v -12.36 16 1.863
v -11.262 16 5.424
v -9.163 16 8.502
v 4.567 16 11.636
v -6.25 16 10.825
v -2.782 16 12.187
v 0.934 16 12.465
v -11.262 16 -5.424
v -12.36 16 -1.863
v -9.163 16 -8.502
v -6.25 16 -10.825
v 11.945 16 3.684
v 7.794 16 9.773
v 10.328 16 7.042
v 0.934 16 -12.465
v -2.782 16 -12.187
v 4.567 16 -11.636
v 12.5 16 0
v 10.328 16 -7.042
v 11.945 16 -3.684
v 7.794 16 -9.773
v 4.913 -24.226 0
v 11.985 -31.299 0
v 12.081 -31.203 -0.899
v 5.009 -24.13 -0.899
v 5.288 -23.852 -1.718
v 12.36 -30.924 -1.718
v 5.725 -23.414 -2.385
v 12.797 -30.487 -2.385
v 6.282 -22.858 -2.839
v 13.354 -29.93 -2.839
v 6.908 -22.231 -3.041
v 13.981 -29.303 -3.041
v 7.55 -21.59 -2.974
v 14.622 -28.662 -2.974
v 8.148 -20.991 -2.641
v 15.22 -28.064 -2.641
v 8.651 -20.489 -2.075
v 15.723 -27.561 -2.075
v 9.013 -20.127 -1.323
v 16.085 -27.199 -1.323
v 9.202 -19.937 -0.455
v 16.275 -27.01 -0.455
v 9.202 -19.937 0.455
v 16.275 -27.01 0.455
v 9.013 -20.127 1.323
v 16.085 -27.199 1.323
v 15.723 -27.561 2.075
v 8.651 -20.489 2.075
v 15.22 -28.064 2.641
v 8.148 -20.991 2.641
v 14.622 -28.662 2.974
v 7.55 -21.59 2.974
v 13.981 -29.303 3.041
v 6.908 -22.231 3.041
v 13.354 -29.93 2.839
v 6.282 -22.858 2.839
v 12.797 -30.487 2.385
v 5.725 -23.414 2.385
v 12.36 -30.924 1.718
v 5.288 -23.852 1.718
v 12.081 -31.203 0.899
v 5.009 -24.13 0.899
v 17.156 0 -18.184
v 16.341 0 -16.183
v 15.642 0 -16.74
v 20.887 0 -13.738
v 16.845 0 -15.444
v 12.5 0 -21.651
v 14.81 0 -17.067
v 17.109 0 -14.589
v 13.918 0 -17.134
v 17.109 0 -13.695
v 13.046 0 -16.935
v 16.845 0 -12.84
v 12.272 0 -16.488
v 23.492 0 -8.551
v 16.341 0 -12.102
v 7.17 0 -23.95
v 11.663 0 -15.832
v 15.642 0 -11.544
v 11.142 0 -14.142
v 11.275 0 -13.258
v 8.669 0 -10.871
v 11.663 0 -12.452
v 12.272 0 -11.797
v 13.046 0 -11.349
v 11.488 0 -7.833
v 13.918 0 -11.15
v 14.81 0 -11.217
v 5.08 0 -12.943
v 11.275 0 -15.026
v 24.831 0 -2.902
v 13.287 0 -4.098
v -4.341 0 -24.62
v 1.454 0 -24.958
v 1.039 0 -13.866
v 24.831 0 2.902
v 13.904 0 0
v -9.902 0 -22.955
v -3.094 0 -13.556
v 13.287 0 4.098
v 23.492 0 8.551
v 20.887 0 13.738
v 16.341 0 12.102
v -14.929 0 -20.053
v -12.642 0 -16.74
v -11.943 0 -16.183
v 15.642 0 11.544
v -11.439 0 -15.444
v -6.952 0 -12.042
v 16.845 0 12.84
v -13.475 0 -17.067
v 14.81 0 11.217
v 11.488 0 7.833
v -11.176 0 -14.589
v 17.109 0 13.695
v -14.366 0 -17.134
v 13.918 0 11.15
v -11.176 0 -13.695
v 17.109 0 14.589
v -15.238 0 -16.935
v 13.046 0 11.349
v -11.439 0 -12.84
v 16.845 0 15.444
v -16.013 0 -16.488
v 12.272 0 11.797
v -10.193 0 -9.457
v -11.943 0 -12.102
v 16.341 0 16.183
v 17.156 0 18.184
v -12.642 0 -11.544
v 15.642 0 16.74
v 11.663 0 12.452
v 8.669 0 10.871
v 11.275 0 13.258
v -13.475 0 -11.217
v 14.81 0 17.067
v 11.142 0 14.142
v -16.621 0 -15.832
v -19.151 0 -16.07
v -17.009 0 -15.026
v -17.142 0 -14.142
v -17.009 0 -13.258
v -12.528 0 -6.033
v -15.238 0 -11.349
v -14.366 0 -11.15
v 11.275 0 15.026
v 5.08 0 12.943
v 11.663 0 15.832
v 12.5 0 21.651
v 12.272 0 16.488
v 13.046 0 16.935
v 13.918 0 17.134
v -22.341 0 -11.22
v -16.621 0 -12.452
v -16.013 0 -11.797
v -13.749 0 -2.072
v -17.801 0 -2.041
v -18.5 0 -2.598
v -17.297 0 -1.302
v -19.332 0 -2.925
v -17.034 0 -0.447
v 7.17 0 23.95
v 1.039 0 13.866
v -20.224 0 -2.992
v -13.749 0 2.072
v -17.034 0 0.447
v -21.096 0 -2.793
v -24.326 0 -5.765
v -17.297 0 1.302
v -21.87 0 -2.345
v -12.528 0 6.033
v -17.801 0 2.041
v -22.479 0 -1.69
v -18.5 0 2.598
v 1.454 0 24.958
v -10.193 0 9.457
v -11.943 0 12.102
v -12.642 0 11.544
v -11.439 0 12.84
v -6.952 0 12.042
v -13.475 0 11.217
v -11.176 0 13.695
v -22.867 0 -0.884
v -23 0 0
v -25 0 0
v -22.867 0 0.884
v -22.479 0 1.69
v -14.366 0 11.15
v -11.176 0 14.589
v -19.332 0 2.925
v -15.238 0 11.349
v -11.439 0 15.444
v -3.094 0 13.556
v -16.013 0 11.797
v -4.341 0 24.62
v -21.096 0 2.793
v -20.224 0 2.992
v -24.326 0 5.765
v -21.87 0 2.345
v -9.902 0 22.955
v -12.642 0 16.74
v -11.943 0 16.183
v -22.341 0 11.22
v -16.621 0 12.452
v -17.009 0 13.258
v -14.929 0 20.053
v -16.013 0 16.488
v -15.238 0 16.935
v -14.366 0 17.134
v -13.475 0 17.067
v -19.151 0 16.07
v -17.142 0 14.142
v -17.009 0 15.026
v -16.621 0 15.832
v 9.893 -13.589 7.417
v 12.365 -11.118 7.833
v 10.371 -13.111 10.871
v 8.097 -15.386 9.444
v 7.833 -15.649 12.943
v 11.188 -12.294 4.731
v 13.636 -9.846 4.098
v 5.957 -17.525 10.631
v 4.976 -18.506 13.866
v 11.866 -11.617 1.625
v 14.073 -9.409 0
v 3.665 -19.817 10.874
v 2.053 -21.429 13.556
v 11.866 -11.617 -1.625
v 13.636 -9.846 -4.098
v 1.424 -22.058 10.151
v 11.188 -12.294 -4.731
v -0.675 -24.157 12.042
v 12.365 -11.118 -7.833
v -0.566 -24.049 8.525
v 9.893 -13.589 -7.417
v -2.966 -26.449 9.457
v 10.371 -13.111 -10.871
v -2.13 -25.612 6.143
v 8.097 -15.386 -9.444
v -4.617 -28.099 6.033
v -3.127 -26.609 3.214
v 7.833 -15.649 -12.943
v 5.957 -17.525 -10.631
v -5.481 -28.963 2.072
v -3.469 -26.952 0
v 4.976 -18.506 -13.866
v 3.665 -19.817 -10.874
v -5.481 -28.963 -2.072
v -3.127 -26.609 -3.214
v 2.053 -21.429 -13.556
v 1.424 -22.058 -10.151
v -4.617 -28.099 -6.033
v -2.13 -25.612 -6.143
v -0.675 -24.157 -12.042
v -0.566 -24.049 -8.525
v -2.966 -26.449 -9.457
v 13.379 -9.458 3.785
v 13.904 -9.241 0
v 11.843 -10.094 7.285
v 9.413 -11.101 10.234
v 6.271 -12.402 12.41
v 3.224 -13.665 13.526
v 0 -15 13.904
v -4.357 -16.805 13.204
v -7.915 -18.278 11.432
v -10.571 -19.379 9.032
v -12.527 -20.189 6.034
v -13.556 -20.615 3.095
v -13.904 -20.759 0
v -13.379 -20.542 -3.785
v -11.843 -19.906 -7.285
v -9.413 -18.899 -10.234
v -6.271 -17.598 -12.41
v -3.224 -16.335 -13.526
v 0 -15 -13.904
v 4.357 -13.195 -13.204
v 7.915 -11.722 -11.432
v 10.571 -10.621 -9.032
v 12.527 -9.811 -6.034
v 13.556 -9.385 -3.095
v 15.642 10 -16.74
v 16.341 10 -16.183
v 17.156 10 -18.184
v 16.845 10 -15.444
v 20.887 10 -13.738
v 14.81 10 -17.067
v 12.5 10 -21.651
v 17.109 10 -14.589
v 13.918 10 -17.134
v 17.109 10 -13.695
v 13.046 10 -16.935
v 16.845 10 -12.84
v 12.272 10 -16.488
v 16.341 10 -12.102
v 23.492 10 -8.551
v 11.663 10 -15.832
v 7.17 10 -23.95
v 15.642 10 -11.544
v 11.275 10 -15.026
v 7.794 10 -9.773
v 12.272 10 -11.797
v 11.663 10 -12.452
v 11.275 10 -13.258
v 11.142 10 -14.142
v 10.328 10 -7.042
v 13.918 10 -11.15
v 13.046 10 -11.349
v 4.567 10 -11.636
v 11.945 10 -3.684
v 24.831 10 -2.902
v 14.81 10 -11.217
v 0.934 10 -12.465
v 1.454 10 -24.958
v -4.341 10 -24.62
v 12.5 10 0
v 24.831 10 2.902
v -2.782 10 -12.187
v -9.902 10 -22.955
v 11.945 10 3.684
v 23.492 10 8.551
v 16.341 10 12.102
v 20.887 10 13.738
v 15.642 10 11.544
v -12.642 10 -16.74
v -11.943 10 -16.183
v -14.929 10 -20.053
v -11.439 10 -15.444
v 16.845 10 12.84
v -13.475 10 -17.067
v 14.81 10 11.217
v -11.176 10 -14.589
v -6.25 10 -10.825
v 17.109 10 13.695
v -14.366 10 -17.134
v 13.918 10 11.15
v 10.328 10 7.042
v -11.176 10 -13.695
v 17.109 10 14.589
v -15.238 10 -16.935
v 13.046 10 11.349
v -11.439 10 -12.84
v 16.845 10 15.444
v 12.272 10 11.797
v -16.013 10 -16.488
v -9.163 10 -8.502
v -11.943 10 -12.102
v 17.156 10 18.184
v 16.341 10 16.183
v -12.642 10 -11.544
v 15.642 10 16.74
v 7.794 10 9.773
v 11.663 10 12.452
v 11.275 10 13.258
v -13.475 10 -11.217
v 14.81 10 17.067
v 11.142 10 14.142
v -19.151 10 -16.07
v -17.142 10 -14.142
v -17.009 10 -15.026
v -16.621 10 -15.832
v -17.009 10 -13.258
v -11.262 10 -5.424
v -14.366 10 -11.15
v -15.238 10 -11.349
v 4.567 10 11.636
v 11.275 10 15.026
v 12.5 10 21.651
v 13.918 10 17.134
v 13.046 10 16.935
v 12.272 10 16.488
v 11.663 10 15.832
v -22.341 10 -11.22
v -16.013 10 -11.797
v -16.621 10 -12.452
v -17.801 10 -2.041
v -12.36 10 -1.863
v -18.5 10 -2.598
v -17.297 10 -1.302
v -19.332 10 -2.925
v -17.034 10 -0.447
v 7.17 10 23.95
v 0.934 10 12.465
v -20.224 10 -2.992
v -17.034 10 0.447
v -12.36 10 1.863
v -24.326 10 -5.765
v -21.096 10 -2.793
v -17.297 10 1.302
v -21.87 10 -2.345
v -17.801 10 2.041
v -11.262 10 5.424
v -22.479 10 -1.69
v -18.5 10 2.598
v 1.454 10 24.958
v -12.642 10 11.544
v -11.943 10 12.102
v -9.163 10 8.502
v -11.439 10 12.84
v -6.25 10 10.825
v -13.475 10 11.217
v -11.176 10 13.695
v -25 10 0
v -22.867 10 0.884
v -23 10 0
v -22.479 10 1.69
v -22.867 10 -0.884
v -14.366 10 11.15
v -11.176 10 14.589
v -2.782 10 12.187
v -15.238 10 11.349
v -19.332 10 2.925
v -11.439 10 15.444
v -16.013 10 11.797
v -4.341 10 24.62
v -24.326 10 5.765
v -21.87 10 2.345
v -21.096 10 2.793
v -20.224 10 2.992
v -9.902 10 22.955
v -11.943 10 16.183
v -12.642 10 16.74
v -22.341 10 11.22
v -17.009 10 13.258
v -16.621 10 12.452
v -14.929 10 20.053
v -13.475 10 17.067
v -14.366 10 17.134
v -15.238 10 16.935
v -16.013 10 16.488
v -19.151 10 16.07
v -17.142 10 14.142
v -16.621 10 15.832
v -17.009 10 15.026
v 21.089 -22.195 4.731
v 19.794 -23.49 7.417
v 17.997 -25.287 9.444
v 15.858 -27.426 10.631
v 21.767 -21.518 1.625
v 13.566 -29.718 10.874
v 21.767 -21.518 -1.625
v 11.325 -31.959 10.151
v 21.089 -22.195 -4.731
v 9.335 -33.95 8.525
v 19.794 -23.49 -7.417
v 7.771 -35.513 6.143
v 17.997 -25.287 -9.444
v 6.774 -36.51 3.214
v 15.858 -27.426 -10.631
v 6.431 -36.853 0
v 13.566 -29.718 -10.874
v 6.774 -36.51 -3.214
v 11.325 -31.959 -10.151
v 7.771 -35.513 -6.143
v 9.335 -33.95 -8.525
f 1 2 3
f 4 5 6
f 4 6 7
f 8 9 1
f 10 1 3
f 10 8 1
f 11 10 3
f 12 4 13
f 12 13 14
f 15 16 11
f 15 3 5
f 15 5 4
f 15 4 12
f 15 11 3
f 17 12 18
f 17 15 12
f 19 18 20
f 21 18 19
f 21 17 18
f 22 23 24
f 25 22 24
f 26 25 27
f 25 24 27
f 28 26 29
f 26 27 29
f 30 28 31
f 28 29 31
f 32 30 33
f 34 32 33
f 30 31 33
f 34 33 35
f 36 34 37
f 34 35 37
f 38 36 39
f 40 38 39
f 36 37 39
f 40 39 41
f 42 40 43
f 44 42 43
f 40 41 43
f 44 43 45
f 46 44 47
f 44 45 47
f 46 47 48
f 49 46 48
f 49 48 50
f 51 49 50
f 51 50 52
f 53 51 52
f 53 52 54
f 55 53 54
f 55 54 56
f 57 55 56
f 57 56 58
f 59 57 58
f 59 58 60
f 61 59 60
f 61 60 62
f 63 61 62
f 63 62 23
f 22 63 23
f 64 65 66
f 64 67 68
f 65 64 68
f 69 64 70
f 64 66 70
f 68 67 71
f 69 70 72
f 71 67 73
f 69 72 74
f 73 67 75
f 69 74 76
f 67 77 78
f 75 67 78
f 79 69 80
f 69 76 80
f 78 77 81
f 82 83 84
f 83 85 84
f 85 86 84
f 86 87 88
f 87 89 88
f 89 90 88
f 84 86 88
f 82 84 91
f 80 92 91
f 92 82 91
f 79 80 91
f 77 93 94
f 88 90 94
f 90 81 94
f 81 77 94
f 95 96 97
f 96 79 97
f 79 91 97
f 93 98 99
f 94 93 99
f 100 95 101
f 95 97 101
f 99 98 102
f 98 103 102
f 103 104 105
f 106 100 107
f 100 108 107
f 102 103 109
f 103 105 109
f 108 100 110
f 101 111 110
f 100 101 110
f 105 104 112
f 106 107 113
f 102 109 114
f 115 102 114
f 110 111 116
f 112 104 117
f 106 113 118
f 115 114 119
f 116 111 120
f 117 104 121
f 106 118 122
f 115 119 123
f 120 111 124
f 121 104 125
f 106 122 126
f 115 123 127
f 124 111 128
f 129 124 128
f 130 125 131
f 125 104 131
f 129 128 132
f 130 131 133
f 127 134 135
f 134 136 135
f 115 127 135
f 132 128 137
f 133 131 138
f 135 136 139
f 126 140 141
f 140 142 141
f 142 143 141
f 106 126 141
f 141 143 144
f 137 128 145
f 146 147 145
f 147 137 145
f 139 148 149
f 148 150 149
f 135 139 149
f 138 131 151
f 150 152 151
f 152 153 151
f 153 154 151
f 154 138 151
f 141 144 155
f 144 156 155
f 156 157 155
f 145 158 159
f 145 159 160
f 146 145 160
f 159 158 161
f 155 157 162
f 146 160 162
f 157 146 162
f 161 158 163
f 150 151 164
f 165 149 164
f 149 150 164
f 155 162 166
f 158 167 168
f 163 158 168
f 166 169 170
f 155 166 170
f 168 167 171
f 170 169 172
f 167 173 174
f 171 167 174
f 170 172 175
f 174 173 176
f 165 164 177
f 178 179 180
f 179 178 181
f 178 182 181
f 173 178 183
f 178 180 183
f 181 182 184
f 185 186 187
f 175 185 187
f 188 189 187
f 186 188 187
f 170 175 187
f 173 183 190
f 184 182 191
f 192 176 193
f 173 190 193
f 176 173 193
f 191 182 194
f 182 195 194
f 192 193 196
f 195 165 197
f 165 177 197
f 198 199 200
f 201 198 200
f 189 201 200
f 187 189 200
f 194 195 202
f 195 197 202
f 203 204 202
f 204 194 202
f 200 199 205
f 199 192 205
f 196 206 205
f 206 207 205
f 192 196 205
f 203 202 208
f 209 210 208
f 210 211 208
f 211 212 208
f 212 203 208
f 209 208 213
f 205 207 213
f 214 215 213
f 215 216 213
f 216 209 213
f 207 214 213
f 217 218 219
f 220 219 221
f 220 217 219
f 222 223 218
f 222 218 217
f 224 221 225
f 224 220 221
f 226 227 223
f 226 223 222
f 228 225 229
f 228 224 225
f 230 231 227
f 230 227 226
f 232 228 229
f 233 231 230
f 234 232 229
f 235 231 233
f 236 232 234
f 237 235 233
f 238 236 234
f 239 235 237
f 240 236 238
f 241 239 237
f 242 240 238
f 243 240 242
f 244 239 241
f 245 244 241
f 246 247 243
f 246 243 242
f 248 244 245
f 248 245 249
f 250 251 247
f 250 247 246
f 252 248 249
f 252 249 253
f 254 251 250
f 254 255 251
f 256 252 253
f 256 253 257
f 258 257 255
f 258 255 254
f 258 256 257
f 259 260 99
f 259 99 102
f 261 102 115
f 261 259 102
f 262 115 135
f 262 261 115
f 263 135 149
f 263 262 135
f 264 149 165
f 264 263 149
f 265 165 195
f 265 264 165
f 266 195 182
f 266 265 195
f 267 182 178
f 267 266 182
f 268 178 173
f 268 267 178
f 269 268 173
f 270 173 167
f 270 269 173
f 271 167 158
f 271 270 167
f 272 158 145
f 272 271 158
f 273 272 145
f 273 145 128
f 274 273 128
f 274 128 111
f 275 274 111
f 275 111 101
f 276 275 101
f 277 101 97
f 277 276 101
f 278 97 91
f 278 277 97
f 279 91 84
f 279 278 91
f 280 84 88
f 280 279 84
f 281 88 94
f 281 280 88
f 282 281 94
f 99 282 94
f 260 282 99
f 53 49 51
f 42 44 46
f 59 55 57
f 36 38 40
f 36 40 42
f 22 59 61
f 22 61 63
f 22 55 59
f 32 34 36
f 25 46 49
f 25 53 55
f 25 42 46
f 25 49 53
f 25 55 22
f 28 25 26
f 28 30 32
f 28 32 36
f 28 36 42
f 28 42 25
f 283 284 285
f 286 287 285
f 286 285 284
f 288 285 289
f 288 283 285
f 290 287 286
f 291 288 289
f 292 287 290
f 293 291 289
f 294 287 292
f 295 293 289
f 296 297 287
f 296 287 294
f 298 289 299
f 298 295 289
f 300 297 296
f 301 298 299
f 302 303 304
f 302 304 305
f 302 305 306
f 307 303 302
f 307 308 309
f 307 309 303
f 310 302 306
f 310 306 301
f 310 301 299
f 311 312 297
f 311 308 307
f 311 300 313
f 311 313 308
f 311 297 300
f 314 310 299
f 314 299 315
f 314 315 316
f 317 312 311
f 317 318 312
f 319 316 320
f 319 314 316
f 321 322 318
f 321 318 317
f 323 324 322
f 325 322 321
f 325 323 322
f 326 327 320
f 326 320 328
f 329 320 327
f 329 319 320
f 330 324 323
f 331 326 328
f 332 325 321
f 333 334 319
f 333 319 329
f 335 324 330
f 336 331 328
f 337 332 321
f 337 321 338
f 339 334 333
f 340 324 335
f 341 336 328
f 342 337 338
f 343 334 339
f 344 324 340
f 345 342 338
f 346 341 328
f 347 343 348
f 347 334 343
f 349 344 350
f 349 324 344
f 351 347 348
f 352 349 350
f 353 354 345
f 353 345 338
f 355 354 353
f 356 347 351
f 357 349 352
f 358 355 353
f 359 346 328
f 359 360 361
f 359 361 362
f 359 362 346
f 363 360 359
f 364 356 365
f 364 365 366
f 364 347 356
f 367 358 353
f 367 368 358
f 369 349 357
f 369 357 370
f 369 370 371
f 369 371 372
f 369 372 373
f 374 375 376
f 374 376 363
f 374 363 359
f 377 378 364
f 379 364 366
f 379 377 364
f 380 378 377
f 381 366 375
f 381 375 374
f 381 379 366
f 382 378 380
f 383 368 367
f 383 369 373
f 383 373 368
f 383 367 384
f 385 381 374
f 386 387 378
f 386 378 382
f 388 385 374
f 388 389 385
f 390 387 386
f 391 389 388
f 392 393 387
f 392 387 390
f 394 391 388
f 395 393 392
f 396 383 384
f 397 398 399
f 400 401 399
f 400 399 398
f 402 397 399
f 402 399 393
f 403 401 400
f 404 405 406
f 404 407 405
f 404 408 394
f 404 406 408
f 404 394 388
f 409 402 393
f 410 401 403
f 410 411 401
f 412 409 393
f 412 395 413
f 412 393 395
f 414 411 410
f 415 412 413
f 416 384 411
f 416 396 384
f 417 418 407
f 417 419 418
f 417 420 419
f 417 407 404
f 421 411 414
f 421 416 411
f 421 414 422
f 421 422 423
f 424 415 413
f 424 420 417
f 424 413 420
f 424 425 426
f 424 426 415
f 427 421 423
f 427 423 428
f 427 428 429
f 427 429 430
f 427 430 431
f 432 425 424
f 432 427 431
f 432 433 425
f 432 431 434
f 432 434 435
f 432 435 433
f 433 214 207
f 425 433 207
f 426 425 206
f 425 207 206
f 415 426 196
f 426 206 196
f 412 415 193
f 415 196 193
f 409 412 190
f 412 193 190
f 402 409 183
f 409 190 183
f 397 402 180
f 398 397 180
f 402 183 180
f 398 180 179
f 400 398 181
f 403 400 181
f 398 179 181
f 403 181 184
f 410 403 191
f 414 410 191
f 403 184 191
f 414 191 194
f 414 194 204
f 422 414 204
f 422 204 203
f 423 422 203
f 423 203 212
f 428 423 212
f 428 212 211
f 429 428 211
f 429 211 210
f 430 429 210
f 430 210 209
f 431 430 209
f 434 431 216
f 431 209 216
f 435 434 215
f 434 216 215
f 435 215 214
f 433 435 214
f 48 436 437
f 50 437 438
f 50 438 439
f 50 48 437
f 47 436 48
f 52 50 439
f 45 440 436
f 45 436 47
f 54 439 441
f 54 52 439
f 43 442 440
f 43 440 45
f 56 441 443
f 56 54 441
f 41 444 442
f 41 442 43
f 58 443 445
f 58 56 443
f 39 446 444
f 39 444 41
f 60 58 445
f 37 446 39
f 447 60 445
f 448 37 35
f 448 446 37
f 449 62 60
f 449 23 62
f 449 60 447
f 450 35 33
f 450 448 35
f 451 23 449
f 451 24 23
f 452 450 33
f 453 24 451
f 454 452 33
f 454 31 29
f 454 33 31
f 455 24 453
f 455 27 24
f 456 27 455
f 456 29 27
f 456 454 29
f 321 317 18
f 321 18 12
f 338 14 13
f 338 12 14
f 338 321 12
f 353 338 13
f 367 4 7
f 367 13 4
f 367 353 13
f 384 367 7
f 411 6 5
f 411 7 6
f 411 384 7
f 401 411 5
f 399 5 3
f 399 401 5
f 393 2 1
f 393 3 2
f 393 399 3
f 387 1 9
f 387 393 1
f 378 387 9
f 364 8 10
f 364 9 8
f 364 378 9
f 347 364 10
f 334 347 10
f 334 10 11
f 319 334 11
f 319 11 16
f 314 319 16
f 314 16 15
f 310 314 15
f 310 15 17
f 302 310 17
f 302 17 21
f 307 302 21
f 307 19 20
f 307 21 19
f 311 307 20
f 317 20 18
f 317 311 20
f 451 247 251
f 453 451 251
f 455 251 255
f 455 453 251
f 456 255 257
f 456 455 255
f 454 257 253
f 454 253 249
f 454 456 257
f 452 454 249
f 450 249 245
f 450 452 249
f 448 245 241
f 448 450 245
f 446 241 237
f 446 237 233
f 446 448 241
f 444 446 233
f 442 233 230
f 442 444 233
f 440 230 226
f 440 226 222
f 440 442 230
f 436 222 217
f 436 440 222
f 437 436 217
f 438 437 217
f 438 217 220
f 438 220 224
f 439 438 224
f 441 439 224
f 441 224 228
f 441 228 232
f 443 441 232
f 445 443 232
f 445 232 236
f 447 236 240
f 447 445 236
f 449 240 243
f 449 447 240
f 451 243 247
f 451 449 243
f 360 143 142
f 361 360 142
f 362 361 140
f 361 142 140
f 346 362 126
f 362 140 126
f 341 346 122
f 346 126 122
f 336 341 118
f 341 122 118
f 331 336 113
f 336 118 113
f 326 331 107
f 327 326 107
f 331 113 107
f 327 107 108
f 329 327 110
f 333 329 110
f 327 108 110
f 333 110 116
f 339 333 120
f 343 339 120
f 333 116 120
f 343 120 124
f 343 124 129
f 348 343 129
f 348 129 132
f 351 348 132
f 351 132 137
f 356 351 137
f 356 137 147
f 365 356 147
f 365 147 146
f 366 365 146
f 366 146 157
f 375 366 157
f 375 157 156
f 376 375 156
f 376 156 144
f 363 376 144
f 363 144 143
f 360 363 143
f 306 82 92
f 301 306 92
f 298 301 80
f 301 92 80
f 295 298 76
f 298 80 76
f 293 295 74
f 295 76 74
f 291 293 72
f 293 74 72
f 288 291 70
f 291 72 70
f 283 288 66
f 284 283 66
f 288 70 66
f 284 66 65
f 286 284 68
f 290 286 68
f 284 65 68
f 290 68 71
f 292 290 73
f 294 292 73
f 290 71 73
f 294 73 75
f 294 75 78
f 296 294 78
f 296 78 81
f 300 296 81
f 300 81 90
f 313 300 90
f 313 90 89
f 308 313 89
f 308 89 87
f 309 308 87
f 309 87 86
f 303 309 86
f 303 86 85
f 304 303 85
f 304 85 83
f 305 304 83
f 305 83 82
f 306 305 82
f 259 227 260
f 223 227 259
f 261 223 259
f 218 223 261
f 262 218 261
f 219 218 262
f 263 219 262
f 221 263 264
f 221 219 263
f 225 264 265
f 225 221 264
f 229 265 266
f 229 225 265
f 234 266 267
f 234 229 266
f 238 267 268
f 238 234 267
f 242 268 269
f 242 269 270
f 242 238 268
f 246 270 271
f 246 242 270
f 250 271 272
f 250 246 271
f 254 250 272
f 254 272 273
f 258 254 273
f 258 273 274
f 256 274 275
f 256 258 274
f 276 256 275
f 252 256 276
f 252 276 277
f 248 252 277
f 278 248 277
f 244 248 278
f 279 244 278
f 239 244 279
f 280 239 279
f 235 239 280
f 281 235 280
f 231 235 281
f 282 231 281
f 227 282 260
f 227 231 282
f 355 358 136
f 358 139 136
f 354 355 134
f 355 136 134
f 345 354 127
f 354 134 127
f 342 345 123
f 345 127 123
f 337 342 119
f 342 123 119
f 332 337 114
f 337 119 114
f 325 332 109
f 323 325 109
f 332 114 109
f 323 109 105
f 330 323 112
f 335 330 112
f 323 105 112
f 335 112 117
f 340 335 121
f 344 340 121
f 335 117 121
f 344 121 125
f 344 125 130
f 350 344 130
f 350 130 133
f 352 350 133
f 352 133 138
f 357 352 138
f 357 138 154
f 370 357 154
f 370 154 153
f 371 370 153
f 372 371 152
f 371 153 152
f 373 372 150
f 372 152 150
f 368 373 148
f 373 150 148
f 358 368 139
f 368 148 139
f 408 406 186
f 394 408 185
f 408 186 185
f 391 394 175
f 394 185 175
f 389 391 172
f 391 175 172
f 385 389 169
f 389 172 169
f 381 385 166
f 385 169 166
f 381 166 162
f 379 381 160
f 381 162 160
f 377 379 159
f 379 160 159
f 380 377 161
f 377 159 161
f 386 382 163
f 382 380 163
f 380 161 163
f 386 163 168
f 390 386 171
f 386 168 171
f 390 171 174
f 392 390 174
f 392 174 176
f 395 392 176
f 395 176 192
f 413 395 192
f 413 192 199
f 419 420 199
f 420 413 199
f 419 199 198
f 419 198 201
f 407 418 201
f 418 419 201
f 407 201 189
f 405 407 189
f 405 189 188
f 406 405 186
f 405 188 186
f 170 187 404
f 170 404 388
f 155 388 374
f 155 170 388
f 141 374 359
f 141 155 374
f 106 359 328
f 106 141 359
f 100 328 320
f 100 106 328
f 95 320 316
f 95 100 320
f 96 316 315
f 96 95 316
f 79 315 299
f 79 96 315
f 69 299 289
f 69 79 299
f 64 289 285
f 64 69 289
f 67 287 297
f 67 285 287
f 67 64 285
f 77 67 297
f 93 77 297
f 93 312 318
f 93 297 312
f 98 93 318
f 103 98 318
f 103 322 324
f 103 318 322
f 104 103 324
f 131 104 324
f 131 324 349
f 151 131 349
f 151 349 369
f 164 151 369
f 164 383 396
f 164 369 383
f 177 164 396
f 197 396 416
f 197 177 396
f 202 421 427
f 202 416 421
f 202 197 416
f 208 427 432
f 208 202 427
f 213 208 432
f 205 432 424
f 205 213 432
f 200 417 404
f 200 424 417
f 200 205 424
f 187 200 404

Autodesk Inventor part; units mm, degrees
ref_plane "YZ Plane" through (0, 0, 0) normal (1, 0, 0) x (0, 1, 0)
ref_plane "XZ Plane" through (0, 0, 0) normal (0, 1, 0) x (-1, 0, 0)
ref_plane "XY Plane" through (0, 0, 0) normal (0, 0, 1) x (1, 0, 0)
sketch "Boceto1" plane through (0, 0, 0) normal (0, 1, 0) x (-1, 0, 0)
  circle A0 centre (0, 0) radius 25
  circle A1 centre (0, 0) radius 20
  line L0 (0, 0) -> (25, 0)
  line L1 (0, 0) -> (17.6777, -17.6777)
  line L2 (0, 0) -> (25, 0) construction
  line L3 (0, 0) -> (17.6777, 17.6777)
  line L4 (0, 0) -> (25, 0) construction
  line L5 (0, 0) -> (-17.6777, -17.6777)
  line L6 (0, 0) -> (-17.6777, 17.6777)
  circle A2 centre (20, 0) radius 3
  circle A3 centre (14.1421, -14.1421) radius 3
  circle A4 centre (14.1421, 14.1421) radius 3
  circle A5 centre (-14.1421, 14.1421) radius 3
  circle A6 centre (-14.1421, -14.1421) radius 3
  point P0 (16.0984, 11.8677)
  point P1 (11.8677, 16.0984)
  dimension "d0" = 50
  dimension "d1" = 40
  dimension "d2" = 45
  dimension "d3" = 45
  dimension "d4" = 6
  dimension "d5" = 6
  dimension "d6" = 6
  dimension "d7" = 6
  dimension "d8" = 6
extrude "Extrusión1" add sketch "Boceto1" along normal blind 10 contours L0 A2 A1 A4 L3 A0 | A0 L1 A3 A1 A2 L0 | L3 A4 A1 A5 L6 A0 | A0 L5 A6 A1 A3 L1 | L6 A5 A1 A6 L5 A0 | A2 L0 L3 A4 A1 | A1 A3 L1 L0 A2 | A4 L3 L6 A5 A1 | A1 A6 L5 L1 A3 | A5 L6 L5 A6 A1
thread "Rosca1"
thread "Rosca2"
thread "Rosca3"
thread "Rosca4"
sketch "Boceto3" plane through (0, 10, 0) normal (0, 1, 0) x (1, 0, 0)
  circle A0 centre (0, 0) radius 12.5
  dimension "d22" = 25
extrude "Extrusión3" add sketch "Boceto3" along normal blind 6
sketch "Boceto7" plane through (0, 0, 0) normal (0, 0, 1) x (1, 0, 0)
  line L0 (0, 0) -> (0, -15)
  line L1 (0, -15) -> (14.1421, -29.1421)
  dimension "d31" = 15
  dimension "d32" = 20
  dimension "d33" = 135
sketch "Boceto8" plane through (0, 0, 0) normal (0, -1, 0) x (1, 0, 0)
  circle A0 centre (0, 0) radius 13.9045
  dimension "d34" = 27.809
sweep "Barrido1" add profiles "Boceto8" path "Boceto7"
sketch "Boceto10" plane through (14.1421, -29.1421, 0) normal (0.7071, -0.7071, 0) x (-0.7071, -0.7071, 0)
  ellipse E0 centre (-17.6777, 0) end of major axis (-17.6777, -25) minor radius 17.6777 projected
  circle A0 centre (0, 0) radius 13.9045
  circle A1 centre (0, 0) radius 10.9045
  point P0 (-10.6066, 0)
  dimension "d40" = 27.809
  dimension "d41" = 21.809
extrude "Extrusión7" cut sketch "Boceto10" against normal blind 14 contours A0 E0 A1 | E0 A1 A0
sketch "Boceto11" plane through (14.1421, -29.1421, 0) normal (0.7071, -0.7071, 0) x (-0.7071, -0.7071, 0)
  ellipse E0 centre (-17.6777, 0) end of major axis (-17.6777, -25) minor radius 17.6777 projected
  circle A0 centre (0, 0) radius 3.05
  point P0 (-10.6066, 0)
  dimension "d44" = 6.1
extrude "Extrusión8" cut sketch "Boceto11" against normal blind 10 contours A0 E0 | E0 A0 picked at (-0.8572, 1.0724) picked at (0.8995, 0.9612)
properties part number "BaseH"
